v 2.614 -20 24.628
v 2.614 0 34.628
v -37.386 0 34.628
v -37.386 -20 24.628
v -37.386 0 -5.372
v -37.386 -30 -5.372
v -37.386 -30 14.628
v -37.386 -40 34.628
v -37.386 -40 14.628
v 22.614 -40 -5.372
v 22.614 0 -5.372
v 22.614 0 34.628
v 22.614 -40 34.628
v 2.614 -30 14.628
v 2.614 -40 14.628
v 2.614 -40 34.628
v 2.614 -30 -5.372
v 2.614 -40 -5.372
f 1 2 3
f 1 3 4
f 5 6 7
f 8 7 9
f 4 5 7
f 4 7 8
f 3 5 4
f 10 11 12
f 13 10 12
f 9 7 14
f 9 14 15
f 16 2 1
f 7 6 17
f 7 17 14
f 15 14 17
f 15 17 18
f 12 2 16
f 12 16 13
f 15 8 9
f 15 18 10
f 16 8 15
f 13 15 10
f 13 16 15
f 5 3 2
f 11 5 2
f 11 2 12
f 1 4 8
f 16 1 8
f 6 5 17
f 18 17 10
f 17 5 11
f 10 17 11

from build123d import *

# Parameters (mm, degrees)
F0_W     = 60
F0_H     = 40
F1_DEPTH = 40
F2_W     = 10
F2_H     = 20
F3_DEPTH = 40
F5_DEPTH = 40


with BuildPart() as f1:
    # F0 (on Front) → F1 (new body)
    with BuildSketch(Plane.XZ):
        with Locations((-7.386366, 14.628025)):
            Rectangle(F0_W, F0_H)
    extrude(amount=F1_DEPTH)

    # F2 (on face) → F3 (cut)
    with BuildSketch(Plane(origin=(-37.386366, 0, 0), x_dir=(0, -1, 0), z_dir=(-1, 0, 0))):
        with Locations((35, 4.628025)):
            Rectangle(F2_W, F2_H)
    extrude(amount=-F3_DEPTH, mode=Mode.SUBTRACT)

    # F4 (on face) → F5 (cut)
    with BuildSketch(Plane(origin=(-37.386366, 0, 0), x_dir=(0, -1, 0), z_dir=(-1, 0, 0))):
        Polygon((40, 34.628025), (0, 34.628025), (20, 24.628025), align=None)
    extrude(amount=-F5_DEPTH, mode=Mode.SUBTRACT)


solid = f1.part
